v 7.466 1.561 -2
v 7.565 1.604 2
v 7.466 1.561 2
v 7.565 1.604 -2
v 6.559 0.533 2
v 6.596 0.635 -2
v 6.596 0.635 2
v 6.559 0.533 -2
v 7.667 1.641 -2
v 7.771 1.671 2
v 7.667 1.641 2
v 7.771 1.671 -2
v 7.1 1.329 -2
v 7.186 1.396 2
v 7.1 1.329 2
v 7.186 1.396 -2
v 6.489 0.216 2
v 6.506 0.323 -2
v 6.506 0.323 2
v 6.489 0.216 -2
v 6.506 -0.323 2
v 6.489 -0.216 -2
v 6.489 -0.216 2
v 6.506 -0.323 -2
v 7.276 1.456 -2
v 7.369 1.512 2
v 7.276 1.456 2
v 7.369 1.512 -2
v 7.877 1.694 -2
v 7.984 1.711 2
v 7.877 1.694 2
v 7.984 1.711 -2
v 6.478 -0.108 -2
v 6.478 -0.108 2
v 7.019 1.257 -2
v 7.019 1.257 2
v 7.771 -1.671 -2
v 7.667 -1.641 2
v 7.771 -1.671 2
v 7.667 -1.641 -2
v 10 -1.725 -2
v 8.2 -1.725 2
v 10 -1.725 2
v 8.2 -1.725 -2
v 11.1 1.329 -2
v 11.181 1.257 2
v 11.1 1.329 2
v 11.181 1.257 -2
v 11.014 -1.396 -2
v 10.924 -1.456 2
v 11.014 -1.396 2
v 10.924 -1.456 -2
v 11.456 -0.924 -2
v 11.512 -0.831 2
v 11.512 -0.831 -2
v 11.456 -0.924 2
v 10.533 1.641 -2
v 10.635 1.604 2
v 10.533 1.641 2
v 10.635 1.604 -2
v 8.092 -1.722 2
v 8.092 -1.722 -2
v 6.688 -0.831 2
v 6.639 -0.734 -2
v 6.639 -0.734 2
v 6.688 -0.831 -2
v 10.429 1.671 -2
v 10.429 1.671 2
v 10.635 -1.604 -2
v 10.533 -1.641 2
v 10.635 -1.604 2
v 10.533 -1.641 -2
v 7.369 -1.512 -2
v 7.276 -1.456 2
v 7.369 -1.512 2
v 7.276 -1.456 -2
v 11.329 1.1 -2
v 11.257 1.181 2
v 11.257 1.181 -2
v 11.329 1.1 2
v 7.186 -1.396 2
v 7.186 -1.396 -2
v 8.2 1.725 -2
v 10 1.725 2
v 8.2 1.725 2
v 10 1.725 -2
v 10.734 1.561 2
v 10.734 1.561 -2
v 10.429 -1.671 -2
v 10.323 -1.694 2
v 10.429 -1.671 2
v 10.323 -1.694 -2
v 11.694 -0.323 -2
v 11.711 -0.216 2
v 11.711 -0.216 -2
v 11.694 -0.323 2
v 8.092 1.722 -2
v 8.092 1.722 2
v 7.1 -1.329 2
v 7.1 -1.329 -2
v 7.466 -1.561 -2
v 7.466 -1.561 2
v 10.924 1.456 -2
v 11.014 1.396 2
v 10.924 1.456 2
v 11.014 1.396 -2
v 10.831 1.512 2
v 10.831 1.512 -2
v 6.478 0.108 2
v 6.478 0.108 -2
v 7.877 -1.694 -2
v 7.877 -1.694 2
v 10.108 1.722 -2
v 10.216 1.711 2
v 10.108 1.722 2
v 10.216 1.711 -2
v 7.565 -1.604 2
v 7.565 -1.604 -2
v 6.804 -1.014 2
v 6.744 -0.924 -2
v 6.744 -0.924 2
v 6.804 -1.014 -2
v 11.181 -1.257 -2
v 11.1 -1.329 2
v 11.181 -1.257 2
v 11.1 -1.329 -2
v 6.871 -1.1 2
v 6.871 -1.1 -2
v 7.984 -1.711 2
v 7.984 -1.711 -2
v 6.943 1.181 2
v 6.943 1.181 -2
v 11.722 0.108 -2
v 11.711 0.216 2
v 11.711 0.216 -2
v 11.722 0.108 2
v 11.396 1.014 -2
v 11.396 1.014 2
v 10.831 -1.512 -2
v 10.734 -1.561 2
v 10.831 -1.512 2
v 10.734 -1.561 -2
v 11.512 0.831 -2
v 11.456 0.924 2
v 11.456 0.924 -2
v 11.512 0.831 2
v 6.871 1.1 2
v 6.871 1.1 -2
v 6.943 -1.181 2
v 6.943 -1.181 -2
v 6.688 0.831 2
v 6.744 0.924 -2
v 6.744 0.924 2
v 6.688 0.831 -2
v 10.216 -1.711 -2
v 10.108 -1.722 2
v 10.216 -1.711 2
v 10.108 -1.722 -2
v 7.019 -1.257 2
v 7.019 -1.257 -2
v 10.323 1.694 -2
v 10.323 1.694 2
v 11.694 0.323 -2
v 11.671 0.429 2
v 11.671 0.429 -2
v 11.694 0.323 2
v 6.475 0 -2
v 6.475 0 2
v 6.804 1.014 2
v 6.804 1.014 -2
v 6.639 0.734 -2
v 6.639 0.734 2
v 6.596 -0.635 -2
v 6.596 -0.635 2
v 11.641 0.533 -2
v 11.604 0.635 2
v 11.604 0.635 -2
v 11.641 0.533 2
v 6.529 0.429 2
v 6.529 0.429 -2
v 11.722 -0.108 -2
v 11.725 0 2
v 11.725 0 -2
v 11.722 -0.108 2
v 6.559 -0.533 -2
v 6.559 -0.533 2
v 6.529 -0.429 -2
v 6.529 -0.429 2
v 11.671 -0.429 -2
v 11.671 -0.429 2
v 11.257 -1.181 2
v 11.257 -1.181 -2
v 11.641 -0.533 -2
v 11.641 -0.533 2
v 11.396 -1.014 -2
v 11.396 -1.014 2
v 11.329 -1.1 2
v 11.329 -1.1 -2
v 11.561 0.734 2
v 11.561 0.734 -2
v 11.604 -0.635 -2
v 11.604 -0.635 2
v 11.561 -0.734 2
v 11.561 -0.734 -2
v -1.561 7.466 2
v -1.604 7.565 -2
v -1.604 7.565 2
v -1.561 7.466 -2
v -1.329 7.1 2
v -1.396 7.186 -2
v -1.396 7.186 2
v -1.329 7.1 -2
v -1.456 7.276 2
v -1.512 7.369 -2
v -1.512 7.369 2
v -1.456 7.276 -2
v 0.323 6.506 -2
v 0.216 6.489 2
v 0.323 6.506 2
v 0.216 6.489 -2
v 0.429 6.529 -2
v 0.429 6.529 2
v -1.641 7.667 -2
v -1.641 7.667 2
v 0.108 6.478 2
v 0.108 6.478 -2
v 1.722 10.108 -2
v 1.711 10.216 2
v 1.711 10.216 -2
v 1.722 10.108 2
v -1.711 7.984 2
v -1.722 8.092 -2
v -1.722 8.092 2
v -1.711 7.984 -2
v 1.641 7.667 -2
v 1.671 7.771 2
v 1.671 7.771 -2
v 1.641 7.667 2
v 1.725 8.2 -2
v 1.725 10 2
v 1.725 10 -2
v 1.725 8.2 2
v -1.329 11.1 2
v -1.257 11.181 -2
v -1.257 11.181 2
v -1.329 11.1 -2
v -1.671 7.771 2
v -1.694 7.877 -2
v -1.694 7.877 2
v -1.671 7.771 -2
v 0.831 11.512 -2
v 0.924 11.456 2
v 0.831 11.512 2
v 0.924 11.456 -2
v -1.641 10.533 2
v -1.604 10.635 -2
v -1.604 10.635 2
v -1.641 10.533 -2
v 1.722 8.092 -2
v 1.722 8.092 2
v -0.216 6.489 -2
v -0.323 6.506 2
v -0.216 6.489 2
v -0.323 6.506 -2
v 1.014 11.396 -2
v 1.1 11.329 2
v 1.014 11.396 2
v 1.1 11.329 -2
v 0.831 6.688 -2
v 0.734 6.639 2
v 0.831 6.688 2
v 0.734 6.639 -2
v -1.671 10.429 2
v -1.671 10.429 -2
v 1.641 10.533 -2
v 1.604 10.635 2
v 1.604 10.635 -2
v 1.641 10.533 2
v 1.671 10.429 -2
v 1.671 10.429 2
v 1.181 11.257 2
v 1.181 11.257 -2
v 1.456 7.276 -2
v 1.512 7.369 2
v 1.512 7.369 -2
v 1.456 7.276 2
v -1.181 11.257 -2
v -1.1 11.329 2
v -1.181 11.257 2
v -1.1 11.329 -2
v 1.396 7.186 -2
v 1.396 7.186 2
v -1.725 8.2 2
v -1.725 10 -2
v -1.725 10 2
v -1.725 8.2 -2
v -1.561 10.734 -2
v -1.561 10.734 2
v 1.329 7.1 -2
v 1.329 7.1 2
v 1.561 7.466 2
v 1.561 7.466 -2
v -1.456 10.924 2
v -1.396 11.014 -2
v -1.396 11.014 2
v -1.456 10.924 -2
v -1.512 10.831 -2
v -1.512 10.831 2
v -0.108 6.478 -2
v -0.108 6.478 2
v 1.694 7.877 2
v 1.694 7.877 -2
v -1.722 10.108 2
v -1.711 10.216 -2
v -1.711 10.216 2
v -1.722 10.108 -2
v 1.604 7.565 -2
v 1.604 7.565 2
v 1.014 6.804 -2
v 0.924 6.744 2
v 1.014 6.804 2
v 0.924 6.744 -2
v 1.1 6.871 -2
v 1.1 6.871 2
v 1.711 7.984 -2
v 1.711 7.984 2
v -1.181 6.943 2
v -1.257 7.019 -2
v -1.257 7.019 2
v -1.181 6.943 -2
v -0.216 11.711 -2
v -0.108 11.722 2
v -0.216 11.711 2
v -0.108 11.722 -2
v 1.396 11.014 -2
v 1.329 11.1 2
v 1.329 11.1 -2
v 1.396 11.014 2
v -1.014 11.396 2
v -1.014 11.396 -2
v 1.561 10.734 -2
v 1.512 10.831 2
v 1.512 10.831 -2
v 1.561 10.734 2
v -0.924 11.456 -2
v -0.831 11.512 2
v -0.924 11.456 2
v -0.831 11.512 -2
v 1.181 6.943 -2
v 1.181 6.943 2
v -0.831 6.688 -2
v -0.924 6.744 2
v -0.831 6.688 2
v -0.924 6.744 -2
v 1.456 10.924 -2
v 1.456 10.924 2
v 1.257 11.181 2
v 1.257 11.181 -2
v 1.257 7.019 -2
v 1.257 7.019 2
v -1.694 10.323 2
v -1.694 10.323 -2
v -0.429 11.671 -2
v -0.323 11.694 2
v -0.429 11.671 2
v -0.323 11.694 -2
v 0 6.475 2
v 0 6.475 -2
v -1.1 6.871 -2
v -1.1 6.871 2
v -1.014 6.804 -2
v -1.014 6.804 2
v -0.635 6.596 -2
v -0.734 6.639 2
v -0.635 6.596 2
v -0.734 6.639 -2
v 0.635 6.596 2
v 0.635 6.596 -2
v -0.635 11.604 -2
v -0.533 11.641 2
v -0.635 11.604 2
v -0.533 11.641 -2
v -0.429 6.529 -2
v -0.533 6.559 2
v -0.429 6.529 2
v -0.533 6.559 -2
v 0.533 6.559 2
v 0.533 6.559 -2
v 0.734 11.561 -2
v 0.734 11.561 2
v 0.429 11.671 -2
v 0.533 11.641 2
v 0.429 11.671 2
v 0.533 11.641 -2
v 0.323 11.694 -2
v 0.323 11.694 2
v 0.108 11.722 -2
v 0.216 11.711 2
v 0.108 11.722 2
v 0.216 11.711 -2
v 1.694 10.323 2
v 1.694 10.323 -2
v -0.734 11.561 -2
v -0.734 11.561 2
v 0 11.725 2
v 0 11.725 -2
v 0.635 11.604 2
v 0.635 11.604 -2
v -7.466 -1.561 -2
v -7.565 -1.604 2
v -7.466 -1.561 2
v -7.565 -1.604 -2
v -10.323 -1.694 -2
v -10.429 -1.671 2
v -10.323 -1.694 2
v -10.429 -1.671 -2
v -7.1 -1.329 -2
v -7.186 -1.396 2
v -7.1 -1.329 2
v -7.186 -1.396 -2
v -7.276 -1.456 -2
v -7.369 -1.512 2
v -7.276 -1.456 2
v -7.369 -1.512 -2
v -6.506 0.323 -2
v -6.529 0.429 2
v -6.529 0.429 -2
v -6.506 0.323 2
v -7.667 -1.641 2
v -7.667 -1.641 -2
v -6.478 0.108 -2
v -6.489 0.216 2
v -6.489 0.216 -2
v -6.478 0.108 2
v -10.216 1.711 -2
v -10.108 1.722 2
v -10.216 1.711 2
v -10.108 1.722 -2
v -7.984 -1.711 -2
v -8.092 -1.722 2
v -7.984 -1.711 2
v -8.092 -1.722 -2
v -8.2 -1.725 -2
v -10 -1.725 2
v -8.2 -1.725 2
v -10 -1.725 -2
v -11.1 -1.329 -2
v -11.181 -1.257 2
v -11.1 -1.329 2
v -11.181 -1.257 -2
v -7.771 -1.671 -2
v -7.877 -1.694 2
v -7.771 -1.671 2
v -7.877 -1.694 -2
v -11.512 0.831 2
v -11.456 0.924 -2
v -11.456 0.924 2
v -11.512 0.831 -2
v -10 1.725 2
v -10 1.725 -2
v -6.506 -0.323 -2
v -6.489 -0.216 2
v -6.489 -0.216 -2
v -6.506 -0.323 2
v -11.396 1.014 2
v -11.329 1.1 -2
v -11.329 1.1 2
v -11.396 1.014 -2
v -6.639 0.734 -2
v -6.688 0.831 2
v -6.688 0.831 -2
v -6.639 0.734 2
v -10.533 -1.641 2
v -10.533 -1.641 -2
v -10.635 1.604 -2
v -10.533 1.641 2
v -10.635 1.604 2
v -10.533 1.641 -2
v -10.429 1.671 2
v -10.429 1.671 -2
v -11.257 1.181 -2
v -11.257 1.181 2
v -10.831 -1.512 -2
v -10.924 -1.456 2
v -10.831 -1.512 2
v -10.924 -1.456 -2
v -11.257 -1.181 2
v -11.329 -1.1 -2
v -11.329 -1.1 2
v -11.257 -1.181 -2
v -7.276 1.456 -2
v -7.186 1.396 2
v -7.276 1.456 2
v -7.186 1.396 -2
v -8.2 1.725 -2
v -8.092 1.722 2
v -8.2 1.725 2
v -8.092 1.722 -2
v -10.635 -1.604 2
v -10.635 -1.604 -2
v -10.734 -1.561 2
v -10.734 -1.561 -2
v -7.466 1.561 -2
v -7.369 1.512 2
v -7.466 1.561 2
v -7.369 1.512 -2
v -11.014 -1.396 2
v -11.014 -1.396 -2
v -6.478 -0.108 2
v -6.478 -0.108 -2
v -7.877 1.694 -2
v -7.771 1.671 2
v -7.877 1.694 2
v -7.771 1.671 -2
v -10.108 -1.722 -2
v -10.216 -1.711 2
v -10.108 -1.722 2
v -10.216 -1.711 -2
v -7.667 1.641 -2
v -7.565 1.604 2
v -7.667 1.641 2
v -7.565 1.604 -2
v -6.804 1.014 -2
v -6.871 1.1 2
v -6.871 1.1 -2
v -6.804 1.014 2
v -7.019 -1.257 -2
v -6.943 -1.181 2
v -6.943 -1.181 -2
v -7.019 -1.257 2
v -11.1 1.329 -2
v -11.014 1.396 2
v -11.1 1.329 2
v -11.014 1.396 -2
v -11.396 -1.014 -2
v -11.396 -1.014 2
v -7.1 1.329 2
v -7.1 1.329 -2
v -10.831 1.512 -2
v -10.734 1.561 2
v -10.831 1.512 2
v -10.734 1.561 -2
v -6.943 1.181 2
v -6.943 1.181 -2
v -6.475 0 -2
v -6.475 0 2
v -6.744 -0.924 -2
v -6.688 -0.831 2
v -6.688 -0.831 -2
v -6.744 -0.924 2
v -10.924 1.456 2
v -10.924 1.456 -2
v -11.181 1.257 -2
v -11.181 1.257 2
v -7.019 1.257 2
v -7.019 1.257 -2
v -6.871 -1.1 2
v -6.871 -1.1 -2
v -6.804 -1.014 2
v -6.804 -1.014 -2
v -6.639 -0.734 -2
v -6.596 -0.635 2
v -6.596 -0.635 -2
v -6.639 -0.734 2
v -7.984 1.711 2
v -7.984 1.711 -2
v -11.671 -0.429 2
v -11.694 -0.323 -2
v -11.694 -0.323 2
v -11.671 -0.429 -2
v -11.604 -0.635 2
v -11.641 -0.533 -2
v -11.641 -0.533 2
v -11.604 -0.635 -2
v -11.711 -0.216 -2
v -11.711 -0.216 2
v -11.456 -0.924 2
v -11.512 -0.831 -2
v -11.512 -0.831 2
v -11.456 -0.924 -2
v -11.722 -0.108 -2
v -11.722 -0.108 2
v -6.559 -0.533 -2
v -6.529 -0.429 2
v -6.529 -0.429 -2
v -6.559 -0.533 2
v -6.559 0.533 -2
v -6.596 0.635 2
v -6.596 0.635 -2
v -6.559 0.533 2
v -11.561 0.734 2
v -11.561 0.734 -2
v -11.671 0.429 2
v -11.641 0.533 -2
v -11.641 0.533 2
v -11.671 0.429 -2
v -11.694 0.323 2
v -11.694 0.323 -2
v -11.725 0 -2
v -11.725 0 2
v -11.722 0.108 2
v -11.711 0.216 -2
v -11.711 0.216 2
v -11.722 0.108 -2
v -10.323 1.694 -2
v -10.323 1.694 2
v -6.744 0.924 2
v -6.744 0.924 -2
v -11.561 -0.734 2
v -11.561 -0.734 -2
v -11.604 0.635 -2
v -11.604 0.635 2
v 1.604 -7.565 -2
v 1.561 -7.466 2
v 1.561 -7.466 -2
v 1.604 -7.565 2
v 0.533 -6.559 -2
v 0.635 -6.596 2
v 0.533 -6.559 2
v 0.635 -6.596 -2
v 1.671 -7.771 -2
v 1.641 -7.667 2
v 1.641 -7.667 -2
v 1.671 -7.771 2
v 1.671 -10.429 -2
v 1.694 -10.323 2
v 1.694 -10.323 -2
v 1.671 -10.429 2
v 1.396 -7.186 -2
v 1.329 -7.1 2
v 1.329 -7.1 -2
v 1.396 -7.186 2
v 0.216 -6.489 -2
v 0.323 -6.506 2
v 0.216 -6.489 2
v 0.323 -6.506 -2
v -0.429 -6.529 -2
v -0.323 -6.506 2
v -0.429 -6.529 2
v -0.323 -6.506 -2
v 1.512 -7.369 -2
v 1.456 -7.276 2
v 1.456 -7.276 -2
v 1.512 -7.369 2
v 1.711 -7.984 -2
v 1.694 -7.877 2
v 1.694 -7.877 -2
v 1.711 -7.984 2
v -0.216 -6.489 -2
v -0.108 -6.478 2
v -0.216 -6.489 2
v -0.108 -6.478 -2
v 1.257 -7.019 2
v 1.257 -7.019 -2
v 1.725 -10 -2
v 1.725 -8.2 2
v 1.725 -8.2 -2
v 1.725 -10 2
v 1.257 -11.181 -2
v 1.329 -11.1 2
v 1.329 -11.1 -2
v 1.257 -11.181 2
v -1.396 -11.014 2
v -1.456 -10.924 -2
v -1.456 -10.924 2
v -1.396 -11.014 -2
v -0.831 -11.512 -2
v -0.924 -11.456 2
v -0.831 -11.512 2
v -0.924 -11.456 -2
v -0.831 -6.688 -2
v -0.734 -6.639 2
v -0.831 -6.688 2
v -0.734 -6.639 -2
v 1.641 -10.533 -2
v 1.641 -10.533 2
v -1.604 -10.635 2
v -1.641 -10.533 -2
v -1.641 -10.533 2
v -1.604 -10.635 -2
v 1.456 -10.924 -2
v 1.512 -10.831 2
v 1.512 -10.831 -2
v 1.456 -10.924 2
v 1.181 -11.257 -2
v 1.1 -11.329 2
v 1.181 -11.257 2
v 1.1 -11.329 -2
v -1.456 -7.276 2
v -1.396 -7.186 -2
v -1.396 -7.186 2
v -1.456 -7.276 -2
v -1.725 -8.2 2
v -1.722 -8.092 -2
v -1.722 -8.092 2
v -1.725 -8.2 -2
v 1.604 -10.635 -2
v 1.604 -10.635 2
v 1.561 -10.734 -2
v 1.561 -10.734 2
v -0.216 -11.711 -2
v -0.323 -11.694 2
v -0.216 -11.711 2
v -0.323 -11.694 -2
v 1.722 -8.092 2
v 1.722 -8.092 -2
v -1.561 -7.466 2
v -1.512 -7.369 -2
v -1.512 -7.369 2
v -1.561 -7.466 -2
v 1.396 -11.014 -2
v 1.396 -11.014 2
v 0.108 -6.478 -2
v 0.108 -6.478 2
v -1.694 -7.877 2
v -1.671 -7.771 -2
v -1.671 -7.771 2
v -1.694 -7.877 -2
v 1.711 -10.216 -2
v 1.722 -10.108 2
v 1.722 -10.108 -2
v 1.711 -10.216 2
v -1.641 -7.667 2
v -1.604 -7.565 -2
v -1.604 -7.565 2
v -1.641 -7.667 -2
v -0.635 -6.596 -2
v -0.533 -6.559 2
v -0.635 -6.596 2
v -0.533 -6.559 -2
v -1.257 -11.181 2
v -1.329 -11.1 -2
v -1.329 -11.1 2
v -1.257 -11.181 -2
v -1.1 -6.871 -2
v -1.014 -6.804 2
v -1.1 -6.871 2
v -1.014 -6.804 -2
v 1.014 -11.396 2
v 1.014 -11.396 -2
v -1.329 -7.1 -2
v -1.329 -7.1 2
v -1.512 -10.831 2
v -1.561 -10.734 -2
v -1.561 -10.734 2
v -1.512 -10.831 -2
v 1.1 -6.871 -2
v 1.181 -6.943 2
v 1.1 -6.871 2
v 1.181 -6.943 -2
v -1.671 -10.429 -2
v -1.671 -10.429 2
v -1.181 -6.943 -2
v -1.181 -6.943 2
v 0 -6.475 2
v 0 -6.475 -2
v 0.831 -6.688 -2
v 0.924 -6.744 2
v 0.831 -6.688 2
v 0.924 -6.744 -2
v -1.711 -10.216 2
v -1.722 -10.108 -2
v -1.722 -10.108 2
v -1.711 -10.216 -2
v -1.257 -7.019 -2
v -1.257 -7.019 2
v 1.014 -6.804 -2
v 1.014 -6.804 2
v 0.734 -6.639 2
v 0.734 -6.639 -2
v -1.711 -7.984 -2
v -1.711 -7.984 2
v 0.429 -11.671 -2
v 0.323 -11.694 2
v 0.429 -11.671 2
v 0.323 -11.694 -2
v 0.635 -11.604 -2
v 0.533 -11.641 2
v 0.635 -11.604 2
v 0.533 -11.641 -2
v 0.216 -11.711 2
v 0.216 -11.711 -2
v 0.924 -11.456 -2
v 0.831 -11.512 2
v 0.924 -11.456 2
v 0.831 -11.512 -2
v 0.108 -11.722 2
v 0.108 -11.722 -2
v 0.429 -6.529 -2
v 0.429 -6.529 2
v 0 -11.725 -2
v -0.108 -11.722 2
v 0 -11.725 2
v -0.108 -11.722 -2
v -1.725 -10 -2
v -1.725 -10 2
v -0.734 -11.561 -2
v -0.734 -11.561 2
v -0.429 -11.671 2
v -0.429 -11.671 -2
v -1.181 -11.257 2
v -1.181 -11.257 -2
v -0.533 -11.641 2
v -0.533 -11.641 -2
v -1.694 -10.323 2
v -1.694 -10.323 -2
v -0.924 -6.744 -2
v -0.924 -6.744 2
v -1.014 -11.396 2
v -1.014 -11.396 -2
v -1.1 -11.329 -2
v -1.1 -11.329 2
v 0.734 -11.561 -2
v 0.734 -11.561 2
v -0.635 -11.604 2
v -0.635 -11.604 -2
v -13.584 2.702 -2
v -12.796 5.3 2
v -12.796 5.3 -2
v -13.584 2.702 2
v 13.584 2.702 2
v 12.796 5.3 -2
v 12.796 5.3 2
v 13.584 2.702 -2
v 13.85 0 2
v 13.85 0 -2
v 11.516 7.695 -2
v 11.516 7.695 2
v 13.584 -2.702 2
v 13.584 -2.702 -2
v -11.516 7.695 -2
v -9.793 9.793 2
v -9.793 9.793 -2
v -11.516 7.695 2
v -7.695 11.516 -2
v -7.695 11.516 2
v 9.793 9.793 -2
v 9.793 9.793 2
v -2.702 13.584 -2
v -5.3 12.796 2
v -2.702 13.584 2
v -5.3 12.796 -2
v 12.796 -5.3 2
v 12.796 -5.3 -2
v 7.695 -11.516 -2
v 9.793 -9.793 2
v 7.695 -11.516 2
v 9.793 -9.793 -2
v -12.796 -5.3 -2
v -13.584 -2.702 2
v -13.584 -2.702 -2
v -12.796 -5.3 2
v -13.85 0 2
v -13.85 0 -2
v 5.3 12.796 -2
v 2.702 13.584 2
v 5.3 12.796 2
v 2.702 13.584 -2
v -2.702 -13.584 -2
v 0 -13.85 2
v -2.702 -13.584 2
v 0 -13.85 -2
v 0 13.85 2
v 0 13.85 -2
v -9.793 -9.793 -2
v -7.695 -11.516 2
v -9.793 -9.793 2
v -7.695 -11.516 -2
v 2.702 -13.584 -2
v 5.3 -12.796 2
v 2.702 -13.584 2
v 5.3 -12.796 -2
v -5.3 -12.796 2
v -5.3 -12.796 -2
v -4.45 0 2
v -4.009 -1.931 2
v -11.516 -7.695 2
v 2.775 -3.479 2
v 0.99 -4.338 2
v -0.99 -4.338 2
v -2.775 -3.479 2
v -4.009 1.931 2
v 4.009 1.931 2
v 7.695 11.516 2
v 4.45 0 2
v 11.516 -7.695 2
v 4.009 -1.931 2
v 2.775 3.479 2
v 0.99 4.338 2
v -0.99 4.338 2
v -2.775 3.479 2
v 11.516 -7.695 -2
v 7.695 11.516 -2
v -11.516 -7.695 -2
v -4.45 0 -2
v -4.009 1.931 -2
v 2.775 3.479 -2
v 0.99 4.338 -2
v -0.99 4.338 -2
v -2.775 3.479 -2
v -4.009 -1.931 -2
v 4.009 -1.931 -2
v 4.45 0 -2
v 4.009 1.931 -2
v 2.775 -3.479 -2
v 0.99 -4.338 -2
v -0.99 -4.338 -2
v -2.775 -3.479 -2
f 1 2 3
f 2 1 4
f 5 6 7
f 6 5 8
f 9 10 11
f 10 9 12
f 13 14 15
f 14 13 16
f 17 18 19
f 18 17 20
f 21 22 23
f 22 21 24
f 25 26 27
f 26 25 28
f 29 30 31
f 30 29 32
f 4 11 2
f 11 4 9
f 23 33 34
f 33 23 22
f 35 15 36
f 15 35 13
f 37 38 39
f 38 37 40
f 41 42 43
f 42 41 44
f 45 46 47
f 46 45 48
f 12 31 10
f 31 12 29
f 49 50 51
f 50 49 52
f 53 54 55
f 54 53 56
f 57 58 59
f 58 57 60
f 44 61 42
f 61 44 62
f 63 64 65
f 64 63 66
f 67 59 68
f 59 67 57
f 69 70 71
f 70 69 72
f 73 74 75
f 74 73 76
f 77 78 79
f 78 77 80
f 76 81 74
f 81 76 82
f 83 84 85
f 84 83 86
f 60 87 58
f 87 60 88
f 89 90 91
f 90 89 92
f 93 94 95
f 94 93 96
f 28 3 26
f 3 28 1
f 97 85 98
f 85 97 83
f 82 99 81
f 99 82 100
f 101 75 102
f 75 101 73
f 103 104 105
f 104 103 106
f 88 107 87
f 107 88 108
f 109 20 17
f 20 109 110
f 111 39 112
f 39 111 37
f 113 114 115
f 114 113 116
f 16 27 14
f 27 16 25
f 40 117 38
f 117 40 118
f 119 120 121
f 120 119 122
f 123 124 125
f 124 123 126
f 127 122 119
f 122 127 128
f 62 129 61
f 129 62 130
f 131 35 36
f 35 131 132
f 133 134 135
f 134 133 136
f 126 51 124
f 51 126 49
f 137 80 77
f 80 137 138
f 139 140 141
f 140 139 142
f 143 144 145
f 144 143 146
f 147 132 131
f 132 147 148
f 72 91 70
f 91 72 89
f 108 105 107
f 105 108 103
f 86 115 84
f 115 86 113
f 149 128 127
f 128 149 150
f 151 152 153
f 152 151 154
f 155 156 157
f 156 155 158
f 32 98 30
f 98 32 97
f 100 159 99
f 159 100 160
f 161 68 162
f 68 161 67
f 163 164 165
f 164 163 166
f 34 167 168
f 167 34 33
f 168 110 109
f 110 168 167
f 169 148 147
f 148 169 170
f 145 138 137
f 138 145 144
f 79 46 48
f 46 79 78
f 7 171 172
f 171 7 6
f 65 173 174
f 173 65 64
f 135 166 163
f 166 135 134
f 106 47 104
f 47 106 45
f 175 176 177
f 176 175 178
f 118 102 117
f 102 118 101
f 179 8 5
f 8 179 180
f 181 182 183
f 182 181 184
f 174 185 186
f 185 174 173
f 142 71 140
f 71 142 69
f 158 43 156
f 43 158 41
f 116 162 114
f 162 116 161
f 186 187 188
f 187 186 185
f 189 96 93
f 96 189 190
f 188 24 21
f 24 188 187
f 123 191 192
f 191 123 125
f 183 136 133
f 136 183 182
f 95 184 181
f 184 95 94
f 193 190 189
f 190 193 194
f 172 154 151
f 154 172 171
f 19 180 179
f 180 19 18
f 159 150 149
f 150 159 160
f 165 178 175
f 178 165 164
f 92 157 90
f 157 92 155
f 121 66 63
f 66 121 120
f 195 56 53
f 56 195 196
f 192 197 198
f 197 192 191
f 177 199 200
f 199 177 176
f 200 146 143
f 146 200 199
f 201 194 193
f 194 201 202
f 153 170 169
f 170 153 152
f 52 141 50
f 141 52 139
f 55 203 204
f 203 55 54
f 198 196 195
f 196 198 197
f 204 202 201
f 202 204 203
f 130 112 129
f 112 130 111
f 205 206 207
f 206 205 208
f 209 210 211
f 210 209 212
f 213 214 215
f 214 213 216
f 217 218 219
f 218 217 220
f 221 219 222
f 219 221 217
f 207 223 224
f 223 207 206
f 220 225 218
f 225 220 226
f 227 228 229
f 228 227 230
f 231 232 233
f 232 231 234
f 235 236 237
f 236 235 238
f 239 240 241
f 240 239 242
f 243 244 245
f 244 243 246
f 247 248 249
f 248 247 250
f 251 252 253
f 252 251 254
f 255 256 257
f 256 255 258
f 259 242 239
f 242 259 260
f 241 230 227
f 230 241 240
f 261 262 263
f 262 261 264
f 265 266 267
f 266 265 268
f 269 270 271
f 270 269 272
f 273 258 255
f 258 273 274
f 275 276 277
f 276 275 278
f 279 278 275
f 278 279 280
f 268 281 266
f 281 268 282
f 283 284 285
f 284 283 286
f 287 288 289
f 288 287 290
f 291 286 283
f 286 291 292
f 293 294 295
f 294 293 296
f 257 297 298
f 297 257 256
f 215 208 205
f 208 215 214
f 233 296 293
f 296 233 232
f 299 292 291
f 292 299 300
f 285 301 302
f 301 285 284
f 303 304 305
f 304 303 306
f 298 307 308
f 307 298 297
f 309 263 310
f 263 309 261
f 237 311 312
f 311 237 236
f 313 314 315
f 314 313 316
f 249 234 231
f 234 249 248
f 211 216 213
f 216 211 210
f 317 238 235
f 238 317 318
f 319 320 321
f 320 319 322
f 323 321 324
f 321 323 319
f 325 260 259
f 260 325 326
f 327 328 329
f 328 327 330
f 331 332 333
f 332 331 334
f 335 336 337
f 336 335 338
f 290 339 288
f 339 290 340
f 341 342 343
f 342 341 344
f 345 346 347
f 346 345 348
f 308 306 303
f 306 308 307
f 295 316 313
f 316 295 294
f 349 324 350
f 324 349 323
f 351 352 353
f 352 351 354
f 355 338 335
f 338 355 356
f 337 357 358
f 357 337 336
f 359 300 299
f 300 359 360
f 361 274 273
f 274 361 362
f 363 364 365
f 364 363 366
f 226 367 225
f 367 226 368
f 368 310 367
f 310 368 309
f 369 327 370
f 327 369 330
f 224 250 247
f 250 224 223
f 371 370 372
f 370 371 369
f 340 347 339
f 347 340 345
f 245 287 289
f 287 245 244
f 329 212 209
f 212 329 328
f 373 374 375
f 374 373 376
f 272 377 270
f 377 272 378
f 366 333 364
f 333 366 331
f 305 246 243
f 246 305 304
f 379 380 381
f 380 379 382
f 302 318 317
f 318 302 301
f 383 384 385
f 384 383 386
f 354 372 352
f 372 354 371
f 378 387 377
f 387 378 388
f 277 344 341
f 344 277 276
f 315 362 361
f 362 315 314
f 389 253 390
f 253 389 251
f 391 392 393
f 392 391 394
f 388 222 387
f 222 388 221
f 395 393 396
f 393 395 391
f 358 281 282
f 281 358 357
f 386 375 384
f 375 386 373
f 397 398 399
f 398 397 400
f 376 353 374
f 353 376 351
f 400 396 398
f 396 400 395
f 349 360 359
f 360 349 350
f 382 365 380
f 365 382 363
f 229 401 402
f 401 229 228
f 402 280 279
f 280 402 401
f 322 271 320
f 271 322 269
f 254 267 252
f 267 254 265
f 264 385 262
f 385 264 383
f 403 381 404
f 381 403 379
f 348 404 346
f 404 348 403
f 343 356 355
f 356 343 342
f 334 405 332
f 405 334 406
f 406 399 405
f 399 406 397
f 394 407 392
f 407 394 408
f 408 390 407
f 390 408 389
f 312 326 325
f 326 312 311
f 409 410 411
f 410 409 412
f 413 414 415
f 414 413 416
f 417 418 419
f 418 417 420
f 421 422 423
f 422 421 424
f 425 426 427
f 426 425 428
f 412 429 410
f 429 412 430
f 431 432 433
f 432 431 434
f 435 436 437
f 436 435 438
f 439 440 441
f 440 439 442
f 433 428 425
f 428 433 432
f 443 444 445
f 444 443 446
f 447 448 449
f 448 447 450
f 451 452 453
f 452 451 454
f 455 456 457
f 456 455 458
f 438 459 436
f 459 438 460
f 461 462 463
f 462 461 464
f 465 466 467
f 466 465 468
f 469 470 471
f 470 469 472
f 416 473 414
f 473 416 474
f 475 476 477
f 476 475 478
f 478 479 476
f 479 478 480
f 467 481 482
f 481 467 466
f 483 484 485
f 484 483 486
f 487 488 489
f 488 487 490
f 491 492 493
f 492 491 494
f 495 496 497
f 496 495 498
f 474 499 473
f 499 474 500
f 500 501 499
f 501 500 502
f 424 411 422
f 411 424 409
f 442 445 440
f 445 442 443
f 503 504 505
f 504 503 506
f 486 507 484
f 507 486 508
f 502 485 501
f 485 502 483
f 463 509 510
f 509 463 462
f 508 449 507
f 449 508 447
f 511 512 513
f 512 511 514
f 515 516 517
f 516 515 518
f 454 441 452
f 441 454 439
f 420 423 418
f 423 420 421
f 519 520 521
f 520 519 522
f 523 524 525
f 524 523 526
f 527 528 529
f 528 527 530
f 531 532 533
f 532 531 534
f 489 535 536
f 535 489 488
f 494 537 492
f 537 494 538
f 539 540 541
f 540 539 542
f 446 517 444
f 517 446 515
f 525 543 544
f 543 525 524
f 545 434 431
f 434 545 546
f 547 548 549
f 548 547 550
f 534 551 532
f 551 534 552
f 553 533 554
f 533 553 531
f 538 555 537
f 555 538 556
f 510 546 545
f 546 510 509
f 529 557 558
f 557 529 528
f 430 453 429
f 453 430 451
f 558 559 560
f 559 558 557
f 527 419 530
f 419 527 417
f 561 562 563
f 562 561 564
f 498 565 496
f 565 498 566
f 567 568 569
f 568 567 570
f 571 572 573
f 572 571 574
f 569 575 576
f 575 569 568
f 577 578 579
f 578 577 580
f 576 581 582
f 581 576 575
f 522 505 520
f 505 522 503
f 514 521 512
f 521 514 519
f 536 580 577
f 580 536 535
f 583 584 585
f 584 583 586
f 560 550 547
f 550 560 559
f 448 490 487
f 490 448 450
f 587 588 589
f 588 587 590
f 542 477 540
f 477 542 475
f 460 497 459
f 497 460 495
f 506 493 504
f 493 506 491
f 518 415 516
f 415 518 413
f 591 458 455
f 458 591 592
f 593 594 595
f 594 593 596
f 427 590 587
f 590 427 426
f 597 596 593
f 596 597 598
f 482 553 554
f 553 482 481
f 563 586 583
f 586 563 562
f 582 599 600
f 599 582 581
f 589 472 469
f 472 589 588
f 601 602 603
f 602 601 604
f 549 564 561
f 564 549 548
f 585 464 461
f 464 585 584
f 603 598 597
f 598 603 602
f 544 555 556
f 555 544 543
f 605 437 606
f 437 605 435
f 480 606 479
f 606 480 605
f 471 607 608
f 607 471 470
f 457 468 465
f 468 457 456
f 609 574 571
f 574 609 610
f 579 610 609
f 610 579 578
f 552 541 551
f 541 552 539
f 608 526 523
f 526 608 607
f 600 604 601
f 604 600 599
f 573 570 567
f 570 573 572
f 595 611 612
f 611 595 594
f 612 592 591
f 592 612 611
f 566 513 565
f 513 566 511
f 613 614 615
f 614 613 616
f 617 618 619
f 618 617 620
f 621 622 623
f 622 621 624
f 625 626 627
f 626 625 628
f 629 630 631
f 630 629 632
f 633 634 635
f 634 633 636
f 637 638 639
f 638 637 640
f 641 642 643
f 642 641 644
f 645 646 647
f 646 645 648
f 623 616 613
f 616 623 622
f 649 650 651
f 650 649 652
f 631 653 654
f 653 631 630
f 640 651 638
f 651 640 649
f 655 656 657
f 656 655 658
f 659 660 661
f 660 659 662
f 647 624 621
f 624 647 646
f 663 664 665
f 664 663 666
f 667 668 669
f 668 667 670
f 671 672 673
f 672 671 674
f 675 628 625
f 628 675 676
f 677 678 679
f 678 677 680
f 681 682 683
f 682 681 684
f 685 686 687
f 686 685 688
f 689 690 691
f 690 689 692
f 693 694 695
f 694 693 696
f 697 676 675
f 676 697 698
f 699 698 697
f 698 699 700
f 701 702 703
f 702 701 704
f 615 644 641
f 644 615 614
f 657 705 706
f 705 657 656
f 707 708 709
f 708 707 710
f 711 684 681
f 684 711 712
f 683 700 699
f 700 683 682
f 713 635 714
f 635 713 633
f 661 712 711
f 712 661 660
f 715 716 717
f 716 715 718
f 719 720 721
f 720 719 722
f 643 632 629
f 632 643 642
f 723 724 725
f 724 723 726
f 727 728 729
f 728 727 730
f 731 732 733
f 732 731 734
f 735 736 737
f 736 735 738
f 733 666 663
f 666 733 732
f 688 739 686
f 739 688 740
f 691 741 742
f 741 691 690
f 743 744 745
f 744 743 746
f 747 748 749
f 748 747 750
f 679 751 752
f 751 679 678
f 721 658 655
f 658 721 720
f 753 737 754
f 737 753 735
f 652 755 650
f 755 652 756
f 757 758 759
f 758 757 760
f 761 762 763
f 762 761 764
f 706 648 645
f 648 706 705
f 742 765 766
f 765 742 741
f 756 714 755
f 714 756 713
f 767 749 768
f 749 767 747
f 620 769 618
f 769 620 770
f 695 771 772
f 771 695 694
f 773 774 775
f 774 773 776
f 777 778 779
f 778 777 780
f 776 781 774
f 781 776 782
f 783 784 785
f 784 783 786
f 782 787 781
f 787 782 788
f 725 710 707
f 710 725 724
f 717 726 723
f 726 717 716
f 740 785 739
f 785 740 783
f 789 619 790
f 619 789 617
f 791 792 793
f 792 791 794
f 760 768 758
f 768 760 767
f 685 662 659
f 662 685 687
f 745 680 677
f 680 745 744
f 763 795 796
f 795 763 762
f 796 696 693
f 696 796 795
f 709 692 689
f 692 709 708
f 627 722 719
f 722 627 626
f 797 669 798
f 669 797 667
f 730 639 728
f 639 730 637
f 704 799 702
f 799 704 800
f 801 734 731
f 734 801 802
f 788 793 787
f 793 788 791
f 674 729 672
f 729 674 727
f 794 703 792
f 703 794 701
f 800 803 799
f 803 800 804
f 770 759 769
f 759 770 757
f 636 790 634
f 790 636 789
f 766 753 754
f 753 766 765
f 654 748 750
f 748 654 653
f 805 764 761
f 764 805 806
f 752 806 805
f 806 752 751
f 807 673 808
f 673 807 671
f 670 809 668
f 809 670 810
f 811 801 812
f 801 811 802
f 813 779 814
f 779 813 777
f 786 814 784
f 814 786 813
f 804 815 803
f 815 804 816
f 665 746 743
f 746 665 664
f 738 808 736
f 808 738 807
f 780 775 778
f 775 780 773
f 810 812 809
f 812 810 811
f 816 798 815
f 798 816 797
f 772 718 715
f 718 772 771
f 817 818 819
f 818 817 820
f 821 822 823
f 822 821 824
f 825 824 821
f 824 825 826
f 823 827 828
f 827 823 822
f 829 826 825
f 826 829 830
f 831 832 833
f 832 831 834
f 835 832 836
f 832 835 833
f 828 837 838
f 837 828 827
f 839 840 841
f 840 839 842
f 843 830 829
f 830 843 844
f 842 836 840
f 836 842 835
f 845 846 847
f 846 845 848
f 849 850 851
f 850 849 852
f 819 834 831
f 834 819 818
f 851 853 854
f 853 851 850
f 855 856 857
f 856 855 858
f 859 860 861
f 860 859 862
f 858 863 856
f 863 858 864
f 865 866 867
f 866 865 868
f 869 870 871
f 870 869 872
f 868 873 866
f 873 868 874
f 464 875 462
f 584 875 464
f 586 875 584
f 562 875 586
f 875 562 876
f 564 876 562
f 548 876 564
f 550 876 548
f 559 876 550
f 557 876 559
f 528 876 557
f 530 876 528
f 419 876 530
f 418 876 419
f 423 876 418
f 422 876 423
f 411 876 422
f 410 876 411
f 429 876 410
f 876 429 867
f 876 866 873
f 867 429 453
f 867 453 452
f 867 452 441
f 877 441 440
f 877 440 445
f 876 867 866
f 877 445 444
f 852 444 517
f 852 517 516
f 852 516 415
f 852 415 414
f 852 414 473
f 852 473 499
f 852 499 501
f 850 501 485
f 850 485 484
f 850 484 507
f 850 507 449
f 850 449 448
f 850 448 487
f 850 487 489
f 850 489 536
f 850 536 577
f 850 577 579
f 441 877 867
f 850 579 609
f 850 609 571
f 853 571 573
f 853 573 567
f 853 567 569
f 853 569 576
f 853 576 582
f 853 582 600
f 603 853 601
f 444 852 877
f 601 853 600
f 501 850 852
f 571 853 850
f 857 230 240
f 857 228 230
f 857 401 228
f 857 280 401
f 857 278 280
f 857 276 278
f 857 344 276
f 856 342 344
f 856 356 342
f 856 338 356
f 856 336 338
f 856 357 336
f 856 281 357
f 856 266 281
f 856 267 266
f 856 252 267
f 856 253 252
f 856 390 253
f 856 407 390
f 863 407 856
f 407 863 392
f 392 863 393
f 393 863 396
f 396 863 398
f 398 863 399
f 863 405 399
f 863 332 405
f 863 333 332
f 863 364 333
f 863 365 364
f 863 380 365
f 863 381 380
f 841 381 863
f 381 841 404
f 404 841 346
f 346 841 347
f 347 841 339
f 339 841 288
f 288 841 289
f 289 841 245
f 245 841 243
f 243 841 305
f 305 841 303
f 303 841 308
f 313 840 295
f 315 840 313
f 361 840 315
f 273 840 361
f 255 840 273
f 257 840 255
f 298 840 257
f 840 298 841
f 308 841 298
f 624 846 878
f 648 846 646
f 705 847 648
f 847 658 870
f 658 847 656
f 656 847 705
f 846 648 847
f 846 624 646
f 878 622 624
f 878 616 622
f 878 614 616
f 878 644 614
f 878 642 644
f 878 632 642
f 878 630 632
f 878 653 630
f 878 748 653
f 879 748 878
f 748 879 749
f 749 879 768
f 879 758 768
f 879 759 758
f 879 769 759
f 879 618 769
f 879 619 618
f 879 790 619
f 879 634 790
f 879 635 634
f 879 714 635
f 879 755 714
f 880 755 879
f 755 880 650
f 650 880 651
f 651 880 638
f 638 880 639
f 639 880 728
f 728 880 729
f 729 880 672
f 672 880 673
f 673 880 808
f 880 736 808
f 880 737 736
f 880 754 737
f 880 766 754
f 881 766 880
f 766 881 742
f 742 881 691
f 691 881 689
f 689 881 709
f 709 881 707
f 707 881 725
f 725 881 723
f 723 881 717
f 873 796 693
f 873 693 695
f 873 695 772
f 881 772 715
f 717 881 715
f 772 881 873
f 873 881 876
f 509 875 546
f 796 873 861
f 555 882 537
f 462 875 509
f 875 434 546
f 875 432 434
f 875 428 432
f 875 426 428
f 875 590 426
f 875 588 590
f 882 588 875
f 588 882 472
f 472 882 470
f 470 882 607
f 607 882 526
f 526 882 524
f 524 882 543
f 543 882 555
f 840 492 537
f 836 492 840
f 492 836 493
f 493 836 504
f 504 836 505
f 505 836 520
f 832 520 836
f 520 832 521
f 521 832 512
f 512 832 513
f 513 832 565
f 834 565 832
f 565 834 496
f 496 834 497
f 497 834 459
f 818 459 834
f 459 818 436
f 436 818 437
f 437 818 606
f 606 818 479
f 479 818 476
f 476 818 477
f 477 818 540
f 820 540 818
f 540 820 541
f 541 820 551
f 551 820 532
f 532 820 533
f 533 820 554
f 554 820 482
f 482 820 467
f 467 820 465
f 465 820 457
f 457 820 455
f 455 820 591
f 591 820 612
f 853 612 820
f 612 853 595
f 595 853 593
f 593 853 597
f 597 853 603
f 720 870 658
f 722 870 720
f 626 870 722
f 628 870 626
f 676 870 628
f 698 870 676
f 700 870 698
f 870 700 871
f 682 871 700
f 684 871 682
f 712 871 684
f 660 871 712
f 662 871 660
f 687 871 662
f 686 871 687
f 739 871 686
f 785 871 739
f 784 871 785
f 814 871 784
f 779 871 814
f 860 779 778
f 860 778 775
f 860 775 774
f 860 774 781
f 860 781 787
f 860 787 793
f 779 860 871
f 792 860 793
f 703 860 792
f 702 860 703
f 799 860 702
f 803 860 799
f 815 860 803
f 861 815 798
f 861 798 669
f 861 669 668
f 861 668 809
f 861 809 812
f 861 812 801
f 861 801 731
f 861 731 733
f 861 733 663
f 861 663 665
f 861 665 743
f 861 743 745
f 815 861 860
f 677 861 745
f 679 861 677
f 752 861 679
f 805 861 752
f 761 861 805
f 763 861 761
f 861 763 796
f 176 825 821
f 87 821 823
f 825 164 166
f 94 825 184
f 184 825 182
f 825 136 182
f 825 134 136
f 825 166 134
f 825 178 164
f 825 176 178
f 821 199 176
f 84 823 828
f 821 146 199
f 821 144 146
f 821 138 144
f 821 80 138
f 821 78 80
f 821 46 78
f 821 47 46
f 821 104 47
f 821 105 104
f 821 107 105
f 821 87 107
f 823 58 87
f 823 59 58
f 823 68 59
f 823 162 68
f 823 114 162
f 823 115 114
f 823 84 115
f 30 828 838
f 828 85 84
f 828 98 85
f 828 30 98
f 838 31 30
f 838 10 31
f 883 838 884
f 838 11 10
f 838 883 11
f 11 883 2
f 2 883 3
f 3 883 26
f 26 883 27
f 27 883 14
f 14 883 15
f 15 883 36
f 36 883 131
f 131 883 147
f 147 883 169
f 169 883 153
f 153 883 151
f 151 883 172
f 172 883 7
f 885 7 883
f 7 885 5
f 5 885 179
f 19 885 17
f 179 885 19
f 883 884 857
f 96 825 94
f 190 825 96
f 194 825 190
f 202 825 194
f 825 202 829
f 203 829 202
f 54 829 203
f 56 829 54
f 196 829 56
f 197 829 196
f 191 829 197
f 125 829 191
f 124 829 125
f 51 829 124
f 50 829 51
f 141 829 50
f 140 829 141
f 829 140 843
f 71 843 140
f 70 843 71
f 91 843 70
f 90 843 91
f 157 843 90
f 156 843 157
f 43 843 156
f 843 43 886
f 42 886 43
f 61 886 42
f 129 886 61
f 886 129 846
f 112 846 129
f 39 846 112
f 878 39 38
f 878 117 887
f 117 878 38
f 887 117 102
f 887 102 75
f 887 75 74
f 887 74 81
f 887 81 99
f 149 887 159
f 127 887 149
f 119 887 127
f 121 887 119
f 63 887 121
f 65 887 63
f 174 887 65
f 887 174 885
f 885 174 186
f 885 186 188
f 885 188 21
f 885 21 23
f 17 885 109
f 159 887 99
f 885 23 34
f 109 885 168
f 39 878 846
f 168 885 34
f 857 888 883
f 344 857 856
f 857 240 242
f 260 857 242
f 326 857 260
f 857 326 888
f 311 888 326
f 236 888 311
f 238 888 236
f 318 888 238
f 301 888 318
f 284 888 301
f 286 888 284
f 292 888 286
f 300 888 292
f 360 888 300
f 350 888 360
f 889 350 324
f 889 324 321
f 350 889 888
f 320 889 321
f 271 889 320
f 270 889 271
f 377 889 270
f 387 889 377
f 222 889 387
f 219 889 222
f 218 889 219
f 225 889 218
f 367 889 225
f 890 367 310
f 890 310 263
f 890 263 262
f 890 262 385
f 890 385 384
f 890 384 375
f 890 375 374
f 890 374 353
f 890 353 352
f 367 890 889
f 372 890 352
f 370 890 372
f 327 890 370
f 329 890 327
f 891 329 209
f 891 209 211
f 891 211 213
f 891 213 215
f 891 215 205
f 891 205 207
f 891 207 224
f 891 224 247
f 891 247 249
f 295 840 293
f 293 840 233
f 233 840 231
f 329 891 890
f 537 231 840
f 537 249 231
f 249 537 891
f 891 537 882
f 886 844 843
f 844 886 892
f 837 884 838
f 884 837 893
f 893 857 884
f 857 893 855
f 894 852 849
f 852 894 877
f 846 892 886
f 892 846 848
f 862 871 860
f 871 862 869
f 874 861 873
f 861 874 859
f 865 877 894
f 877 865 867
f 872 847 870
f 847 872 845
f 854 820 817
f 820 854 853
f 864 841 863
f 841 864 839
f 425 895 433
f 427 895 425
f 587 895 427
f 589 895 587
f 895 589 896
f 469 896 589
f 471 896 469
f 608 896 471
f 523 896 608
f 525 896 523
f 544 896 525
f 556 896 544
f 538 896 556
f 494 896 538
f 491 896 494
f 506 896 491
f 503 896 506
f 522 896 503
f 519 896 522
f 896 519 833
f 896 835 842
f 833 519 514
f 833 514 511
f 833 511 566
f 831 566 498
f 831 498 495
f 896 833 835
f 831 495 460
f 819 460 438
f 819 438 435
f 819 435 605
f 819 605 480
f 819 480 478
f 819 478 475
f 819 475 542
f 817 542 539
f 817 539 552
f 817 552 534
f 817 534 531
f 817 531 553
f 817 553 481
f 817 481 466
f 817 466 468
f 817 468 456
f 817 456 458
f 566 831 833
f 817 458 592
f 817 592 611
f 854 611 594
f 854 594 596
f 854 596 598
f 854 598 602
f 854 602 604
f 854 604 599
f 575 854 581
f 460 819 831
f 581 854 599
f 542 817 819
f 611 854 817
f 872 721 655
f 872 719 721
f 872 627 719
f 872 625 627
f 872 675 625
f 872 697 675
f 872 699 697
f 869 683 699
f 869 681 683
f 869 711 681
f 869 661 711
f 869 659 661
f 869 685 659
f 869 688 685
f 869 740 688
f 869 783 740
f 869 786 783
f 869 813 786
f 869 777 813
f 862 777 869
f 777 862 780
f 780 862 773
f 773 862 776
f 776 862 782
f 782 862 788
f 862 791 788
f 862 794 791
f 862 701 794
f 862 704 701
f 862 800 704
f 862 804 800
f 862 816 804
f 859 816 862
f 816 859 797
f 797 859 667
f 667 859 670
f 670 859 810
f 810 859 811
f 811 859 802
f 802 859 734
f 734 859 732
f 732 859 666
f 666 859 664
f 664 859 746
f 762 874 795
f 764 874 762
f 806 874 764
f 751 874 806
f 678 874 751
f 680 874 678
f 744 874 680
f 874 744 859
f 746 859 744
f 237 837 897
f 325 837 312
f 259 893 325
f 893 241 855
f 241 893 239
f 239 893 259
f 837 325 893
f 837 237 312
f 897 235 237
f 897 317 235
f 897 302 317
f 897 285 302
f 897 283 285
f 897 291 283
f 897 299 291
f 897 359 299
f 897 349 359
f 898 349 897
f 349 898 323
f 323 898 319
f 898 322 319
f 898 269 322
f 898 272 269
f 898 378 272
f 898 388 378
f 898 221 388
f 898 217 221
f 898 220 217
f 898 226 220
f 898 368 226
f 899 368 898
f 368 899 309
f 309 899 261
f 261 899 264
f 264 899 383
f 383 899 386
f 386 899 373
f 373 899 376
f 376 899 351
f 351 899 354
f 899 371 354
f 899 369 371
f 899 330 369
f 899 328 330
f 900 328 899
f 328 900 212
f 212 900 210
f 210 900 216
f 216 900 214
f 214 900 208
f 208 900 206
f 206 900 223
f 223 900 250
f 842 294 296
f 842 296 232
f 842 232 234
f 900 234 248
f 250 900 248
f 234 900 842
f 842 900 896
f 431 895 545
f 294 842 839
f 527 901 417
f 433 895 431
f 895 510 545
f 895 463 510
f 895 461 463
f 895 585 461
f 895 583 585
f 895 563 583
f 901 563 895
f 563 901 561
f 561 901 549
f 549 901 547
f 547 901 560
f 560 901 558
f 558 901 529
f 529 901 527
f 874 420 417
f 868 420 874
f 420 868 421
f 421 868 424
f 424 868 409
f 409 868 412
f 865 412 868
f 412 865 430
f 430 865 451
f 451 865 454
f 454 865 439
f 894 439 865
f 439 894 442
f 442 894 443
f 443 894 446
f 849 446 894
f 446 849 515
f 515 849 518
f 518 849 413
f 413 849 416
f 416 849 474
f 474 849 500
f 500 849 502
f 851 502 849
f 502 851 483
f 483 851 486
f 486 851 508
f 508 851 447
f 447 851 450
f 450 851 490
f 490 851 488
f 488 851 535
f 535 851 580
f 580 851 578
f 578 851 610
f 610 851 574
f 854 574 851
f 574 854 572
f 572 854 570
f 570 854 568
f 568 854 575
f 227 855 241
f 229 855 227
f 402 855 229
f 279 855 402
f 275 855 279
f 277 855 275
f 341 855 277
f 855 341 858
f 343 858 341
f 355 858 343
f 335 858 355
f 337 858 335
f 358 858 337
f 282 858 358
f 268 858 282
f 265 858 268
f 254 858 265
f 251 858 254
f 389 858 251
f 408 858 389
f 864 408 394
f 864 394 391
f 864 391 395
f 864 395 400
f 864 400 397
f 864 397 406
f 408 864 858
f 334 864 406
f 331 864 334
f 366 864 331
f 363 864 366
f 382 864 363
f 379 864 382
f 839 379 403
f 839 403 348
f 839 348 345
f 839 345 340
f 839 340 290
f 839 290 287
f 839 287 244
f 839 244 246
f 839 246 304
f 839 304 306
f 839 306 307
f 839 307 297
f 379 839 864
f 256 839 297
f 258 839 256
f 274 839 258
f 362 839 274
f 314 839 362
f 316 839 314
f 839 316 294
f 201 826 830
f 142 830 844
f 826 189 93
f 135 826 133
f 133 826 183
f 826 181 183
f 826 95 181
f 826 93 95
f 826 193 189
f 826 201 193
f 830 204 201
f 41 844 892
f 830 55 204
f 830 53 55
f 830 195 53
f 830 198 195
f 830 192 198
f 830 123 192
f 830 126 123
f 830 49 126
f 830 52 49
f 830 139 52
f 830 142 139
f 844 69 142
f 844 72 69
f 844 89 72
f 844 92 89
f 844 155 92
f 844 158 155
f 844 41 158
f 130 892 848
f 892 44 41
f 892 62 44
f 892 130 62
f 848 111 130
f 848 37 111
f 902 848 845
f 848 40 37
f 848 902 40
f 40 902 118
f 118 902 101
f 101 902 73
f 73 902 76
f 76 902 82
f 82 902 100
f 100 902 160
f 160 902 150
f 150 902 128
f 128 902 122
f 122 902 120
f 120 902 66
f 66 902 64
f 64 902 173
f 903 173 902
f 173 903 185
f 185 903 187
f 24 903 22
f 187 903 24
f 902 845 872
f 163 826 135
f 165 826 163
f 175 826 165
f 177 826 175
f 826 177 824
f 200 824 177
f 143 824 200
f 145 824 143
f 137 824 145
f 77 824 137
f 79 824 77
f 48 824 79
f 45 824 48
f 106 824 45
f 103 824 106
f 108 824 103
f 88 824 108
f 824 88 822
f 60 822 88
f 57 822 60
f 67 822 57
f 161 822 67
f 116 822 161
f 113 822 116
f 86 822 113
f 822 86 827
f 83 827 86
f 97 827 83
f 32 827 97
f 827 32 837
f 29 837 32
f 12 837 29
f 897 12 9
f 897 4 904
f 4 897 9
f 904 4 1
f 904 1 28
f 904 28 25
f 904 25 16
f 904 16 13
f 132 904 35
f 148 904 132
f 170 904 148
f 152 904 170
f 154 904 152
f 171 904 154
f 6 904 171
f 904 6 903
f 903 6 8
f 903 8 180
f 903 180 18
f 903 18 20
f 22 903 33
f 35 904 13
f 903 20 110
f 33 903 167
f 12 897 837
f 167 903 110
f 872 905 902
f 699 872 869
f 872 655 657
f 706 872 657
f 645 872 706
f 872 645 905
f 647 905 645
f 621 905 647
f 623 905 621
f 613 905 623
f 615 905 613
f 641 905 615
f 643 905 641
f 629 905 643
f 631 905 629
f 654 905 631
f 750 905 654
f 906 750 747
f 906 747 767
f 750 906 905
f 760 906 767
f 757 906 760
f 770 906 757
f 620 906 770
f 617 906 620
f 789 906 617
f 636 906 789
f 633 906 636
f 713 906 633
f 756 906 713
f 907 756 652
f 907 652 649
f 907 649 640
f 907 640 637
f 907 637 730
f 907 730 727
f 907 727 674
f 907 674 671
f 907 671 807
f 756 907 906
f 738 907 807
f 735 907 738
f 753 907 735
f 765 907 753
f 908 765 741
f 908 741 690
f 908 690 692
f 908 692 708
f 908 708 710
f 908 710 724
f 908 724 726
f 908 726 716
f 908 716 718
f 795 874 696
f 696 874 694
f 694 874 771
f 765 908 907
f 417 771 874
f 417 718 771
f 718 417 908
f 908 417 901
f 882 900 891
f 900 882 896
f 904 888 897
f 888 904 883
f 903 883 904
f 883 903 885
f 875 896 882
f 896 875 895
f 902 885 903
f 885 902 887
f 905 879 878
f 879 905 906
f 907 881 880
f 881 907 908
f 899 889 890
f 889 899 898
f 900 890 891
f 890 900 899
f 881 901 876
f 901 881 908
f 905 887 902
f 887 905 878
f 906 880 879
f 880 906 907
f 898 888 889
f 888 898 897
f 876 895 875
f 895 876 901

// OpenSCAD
module mount(diameter){
    
    difference(){
        cylinder(h=4, r=diameter/2, center=true, $fn=32);
        cylinder(h=5, r=4.45, center=true);
        
        for( i = [0:1:3] ){
            rotate([0,0,i*90])
                translate([10,0,0])    
                    hull(){
                    // height = 4.8 
                    // width = 3.45
                    cylinder(h=5, r=3.45/2, center=true, $fn=100);
                    translate([-1.8, 0, 0]) cylinder(h=5, r=3.45/2, center=true,  $fn=100);
        }
    }
}
    
    
}

mount(27.7);

//mount(30.0);
